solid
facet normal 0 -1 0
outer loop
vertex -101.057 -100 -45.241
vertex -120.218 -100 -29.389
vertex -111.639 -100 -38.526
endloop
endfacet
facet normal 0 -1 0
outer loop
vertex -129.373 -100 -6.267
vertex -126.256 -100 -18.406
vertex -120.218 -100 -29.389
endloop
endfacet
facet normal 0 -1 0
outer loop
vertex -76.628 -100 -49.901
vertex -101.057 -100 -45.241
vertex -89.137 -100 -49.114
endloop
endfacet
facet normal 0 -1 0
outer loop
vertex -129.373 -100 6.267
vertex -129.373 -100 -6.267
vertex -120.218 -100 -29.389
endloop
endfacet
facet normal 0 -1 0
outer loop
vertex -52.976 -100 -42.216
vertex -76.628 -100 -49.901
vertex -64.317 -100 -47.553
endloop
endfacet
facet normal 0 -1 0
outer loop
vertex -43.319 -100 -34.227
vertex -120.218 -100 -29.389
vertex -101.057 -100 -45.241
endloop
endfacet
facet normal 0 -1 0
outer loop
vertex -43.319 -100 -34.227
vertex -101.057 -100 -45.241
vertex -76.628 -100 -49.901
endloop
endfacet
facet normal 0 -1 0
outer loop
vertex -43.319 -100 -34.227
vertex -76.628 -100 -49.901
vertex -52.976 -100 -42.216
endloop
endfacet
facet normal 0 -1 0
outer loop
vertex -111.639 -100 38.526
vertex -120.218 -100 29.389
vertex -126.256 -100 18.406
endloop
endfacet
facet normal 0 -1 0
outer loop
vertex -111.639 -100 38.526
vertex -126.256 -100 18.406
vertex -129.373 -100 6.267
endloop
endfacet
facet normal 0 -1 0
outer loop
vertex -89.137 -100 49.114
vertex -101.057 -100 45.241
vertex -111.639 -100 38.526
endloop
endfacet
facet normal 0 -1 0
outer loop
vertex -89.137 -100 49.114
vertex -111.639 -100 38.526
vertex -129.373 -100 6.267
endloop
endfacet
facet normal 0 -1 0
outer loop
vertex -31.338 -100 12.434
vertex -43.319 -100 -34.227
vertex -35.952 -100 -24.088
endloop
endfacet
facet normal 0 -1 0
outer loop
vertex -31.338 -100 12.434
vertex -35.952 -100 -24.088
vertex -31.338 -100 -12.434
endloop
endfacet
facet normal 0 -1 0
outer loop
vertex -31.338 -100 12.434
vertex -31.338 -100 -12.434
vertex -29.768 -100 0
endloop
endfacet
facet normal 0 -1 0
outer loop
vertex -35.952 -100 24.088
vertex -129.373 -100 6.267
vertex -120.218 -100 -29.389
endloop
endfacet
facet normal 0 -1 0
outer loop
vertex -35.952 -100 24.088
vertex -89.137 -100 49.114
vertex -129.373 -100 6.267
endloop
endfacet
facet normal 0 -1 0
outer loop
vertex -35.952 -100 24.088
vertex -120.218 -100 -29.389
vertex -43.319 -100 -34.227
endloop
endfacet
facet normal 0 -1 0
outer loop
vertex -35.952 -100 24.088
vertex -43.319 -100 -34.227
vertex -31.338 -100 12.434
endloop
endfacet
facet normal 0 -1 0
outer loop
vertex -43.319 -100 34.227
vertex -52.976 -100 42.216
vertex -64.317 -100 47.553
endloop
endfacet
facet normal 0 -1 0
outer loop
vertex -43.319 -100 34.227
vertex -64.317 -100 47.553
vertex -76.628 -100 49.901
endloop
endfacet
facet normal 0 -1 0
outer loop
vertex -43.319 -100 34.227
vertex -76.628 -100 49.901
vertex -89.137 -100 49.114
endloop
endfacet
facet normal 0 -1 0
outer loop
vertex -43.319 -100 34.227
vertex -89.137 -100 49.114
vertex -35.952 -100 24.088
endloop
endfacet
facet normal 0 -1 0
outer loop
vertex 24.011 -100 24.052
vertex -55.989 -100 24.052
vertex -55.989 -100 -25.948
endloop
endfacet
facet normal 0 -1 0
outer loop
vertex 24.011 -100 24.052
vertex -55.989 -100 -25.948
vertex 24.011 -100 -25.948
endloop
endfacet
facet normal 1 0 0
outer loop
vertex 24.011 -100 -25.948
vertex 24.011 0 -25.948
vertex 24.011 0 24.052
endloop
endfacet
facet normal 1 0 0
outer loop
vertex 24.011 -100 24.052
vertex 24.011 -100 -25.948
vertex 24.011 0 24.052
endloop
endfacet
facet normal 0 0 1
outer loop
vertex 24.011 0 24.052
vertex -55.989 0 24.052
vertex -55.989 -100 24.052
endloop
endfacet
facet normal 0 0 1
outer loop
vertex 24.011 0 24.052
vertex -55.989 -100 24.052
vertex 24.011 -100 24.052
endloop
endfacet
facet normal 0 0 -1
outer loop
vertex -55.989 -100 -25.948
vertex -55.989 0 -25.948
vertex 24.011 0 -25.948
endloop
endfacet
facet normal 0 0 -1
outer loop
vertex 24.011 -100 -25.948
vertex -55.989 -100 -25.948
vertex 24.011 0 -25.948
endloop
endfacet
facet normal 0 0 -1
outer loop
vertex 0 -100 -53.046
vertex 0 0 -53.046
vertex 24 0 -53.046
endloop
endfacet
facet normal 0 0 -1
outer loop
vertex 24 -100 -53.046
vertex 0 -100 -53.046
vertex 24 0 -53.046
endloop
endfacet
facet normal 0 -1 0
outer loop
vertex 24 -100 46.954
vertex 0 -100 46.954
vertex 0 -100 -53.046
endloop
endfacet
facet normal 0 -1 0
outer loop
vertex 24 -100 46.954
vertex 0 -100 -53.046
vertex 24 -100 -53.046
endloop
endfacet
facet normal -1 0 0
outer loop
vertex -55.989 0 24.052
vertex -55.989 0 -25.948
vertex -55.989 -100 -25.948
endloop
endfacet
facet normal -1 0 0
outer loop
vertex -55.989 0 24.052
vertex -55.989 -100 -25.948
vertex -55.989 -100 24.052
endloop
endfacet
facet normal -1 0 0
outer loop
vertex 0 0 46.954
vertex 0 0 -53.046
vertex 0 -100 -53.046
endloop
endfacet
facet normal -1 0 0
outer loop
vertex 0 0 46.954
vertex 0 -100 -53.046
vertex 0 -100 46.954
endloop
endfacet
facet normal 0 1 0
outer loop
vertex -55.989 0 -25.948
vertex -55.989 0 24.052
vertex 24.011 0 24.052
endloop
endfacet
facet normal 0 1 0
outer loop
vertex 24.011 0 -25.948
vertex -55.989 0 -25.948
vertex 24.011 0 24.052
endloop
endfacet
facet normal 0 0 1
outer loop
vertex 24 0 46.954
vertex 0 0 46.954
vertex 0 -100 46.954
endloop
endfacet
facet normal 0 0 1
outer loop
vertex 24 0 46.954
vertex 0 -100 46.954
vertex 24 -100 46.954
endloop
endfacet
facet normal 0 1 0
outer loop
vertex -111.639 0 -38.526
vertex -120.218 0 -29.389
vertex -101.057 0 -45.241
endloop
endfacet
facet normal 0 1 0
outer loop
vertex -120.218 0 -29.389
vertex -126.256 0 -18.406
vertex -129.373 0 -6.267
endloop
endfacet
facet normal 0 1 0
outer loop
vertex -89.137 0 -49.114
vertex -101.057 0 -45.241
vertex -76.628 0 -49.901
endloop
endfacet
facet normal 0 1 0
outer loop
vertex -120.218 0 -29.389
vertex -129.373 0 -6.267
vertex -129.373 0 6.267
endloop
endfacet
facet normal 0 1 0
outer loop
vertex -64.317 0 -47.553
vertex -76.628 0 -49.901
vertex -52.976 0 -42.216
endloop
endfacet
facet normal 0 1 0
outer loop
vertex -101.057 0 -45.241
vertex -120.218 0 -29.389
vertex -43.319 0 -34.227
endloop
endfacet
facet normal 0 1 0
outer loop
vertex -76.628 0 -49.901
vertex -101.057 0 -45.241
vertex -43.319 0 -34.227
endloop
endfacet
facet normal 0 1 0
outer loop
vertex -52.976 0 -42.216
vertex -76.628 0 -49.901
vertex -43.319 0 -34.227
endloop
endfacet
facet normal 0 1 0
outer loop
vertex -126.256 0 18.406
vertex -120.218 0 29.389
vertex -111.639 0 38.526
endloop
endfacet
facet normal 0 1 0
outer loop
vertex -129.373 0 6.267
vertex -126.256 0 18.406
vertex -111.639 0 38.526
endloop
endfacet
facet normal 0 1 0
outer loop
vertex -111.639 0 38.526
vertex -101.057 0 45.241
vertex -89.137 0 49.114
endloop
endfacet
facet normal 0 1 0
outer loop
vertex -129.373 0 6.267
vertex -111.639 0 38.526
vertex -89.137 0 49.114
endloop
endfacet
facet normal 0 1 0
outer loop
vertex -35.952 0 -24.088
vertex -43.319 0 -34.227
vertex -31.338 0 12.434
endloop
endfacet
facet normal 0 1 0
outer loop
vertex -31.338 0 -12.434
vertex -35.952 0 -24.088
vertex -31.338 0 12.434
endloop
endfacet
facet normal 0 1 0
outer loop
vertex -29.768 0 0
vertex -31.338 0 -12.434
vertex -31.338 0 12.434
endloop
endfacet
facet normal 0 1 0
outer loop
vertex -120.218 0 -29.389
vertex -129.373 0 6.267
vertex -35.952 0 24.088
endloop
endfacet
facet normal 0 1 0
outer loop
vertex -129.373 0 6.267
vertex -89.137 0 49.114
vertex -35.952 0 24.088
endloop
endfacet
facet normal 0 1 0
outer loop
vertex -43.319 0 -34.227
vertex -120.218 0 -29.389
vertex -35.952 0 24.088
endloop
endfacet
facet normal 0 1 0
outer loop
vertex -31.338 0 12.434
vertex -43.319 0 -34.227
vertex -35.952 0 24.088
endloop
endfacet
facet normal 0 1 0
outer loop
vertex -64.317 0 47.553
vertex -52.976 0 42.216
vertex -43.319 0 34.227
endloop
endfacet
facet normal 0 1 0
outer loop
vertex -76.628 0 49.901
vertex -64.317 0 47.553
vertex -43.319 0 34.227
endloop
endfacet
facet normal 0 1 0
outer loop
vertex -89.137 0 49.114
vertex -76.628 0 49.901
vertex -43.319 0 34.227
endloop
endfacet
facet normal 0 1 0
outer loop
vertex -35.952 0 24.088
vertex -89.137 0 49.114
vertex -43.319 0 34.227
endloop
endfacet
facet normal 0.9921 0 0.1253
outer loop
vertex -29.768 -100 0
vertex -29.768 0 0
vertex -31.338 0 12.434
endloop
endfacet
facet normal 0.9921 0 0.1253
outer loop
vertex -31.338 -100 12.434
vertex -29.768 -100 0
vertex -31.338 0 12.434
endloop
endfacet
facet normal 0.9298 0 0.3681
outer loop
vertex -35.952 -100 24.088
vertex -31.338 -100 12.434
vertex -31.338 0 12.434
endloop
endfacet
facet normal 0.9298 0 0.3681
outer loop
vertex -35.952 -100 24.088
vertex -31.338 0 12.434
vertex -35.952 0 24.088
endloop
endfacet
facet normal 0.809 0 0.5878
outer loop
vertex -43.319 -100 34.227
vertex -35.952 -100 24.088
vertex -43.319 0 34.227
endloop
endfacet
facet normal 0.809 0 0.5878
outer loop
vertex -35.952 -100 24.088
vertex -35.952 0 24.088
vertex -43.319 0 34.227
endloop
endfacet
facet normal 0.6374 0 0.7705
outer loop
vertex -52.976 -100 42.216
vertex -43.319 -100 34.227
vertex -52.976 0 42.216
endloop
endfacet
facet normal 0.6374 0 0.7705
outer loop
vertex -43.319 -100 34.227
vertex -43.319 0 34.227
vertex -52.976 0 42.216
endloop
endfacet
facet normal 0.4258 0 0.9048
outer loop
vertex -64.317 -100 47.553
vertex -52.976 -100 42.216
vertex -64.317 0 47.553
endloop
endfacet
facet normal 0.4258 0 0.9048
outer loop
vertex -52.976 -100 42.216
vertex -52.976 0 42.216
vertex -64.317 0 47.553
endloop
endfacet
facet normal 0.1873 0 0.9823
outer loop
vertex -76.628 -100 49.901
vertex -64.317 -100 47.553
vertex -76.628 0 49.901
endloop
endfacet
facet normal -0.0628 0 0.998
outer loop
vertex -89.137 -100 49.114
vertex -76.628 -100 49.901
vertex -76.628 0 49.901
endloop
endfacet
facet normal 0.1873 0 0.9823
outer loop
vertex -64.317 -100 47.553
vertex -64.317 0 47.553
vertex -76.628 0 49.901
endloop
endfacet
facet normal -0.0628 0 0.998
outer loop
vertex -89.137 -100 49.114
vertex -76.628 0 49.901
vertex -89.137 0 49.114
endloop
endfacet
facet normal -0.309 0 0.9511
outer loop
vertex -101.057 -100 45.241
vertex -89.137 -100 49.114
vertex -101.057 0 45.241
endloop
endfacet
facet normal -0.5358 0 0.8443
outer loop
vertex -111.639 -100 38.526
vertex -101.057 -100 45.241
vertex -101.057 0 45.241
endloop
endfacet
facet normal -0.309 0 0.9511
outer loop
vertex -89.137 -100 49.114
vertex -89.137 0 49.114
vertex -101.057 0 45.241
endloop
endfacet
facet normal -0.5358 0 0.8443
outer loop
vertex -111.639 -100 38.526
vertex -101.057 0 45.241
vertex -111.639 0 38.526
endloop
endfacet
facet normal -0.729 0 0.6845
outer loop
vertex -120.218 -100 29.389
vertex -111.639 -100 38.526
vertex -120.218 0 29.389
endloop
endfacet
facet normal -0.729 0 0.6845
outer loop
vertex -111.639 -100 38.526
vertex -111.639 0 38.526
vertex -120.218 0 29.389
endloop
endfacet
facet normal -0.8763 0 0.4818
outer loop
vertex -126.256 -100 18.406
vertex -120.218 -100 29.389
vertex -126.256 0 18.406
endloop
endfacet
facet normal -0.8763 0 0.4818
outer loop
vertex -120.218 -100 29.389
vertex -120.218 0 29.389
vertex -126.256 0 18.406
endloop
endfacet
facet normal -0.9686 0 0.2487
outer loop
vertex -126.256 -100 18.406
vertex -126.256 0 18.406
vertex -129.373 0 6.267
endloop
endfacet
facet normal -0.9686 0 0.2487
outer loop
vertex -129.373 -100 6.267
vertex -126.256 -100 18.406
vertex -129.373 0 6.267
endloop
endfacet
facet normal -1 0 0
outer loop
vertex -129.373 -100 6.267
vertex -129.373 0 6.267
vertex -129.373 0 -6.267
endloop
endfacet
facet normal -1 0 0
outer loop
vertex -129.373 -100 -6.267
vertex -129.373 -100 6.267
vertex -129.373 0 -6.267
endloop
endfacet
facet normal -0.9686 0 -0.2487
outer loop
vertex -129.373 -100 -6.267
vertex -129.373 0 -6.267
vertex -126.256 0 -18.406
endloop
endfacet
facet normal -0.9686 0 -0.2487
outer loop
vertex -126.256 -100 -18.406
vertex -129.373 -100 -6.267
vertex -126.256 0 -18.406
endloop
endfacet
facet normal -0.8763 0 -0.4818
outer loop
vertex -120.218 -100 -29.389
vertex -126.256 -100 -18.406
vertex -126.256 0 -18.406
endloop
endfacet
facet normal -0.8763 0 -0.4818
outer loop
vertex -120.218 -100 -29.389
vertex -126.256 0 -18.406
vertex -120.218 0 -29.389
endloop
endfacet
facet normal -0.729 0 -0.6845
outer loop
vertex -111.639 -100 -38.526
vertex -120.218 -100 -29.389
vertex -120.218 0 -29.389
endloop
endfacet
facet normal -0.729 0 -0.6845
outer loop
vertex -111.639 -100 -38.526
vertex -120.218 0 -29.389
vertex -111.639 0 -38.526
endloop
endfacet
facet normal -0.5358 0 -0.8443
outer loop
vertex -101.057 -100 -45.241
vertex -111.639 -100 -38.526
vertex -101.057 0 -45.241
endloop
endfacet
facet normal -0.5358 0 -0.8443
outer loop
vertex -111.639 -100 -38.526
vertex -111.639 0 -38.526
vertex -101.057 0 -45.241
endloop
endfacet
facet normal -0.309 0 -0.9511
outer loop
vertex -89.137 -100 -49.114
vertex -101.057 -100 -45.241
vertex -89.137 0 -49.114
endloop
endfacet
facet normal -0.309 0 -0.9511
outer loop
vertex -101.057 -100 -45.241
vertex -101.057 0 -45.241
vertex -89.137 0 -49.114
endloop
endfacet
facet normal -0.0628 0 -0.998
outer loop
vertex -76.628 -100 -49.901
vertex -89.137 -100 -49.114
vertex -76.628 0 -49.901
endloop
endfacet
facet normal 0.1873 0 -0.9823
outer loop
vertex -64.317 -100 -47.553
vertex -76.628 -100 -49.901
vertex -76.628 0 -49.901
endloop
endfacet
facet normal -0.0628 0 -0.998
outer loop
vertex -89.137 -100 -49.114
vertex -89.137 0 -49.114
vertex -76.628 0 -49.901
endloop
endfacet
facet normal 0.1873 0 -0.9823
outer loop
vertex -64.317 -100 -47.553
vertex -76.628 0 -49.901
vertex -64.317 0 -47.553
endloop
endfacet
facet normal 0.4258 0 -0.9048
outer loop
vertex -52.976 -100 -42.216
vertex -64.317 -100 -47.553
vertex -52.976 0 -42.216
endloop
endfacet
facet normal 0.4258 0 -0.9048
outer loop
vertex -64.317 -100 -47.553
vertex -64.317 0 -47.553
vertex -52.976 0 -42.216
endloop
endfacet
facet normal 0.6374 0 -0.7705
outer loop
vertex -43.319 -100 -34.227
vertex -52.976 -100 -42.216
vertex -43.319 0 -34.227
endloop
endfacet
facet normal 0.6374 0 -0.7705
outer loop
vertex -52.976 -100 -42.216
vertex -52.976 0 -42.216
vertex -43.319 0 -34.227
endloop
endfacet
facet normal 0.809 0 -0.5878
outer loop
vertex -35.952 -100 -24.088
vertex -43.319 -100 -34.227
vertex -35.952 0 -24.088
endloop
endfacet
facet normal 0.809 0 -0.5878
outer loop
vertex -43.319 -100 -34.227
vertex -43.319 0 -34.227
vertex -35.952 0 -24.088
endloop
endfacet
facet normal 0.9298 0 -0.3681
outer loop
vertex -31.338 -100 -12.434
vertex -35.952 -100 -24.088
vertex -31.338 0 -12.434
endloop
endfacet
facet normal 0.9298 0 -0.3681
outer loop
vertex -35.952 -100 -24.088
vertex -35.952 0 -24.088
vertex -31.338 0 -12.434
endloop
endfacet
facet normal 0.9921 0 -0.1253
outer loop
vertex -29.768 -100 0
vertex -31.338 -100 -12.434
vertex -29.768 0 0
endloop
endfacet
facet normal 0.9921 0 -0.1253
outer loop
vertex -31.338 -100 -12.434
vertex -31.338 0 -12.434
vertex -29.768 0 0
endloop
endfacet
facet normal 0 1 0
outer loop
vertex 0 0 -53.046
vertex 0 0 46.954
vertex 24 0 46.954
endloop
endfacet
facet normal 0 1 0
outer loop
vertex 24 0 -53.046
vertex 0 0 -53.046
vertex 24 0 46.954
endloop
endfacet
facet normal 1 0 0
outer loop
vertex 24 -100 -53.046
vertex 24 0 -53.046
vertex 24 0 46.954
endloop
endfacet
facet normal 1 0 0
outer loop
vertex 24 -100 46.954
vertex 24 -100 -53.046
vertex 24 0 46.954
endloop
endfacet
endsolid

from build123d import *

# Parameters (mm, degrees)
F2_W     = 24
F2_H     = 100
F3_DEPTH = 100
F1_W     = 80
F1_H     = 50
F0_R     = 50


with BuildPart() as f3:
    # F2 (on Front) → F3 (new body)
    with BuildSketch(Plane.XZ):
        with Locations((12, -3.0457645655)):
            Rectangle(F2_W, F2_H)
    extrude(amount=F3_DEPTH)


with BuildPart() as f3b:
    # F1 (on Front) → F3, piece 2 (new body)
    with BuildSketch(Plane.XZ):
        with Locations((-15.9892786234, -0.9483918548)):
            Rectangle(F1_W, F1_H)
    extrude(amount=F3_DEPTH)


with BuildPart() as f3c:
    # F0 (on Front) → F3, piece 3 (new body)
    with BuildSketch(Plane.XZ):
        with Locations((-79.7675750193, 0)):
            Circle(F0_R)
    extrude(amount=F3_DEPTH)


solid = Compound([f3.part, f3b.part, f3c.part])
